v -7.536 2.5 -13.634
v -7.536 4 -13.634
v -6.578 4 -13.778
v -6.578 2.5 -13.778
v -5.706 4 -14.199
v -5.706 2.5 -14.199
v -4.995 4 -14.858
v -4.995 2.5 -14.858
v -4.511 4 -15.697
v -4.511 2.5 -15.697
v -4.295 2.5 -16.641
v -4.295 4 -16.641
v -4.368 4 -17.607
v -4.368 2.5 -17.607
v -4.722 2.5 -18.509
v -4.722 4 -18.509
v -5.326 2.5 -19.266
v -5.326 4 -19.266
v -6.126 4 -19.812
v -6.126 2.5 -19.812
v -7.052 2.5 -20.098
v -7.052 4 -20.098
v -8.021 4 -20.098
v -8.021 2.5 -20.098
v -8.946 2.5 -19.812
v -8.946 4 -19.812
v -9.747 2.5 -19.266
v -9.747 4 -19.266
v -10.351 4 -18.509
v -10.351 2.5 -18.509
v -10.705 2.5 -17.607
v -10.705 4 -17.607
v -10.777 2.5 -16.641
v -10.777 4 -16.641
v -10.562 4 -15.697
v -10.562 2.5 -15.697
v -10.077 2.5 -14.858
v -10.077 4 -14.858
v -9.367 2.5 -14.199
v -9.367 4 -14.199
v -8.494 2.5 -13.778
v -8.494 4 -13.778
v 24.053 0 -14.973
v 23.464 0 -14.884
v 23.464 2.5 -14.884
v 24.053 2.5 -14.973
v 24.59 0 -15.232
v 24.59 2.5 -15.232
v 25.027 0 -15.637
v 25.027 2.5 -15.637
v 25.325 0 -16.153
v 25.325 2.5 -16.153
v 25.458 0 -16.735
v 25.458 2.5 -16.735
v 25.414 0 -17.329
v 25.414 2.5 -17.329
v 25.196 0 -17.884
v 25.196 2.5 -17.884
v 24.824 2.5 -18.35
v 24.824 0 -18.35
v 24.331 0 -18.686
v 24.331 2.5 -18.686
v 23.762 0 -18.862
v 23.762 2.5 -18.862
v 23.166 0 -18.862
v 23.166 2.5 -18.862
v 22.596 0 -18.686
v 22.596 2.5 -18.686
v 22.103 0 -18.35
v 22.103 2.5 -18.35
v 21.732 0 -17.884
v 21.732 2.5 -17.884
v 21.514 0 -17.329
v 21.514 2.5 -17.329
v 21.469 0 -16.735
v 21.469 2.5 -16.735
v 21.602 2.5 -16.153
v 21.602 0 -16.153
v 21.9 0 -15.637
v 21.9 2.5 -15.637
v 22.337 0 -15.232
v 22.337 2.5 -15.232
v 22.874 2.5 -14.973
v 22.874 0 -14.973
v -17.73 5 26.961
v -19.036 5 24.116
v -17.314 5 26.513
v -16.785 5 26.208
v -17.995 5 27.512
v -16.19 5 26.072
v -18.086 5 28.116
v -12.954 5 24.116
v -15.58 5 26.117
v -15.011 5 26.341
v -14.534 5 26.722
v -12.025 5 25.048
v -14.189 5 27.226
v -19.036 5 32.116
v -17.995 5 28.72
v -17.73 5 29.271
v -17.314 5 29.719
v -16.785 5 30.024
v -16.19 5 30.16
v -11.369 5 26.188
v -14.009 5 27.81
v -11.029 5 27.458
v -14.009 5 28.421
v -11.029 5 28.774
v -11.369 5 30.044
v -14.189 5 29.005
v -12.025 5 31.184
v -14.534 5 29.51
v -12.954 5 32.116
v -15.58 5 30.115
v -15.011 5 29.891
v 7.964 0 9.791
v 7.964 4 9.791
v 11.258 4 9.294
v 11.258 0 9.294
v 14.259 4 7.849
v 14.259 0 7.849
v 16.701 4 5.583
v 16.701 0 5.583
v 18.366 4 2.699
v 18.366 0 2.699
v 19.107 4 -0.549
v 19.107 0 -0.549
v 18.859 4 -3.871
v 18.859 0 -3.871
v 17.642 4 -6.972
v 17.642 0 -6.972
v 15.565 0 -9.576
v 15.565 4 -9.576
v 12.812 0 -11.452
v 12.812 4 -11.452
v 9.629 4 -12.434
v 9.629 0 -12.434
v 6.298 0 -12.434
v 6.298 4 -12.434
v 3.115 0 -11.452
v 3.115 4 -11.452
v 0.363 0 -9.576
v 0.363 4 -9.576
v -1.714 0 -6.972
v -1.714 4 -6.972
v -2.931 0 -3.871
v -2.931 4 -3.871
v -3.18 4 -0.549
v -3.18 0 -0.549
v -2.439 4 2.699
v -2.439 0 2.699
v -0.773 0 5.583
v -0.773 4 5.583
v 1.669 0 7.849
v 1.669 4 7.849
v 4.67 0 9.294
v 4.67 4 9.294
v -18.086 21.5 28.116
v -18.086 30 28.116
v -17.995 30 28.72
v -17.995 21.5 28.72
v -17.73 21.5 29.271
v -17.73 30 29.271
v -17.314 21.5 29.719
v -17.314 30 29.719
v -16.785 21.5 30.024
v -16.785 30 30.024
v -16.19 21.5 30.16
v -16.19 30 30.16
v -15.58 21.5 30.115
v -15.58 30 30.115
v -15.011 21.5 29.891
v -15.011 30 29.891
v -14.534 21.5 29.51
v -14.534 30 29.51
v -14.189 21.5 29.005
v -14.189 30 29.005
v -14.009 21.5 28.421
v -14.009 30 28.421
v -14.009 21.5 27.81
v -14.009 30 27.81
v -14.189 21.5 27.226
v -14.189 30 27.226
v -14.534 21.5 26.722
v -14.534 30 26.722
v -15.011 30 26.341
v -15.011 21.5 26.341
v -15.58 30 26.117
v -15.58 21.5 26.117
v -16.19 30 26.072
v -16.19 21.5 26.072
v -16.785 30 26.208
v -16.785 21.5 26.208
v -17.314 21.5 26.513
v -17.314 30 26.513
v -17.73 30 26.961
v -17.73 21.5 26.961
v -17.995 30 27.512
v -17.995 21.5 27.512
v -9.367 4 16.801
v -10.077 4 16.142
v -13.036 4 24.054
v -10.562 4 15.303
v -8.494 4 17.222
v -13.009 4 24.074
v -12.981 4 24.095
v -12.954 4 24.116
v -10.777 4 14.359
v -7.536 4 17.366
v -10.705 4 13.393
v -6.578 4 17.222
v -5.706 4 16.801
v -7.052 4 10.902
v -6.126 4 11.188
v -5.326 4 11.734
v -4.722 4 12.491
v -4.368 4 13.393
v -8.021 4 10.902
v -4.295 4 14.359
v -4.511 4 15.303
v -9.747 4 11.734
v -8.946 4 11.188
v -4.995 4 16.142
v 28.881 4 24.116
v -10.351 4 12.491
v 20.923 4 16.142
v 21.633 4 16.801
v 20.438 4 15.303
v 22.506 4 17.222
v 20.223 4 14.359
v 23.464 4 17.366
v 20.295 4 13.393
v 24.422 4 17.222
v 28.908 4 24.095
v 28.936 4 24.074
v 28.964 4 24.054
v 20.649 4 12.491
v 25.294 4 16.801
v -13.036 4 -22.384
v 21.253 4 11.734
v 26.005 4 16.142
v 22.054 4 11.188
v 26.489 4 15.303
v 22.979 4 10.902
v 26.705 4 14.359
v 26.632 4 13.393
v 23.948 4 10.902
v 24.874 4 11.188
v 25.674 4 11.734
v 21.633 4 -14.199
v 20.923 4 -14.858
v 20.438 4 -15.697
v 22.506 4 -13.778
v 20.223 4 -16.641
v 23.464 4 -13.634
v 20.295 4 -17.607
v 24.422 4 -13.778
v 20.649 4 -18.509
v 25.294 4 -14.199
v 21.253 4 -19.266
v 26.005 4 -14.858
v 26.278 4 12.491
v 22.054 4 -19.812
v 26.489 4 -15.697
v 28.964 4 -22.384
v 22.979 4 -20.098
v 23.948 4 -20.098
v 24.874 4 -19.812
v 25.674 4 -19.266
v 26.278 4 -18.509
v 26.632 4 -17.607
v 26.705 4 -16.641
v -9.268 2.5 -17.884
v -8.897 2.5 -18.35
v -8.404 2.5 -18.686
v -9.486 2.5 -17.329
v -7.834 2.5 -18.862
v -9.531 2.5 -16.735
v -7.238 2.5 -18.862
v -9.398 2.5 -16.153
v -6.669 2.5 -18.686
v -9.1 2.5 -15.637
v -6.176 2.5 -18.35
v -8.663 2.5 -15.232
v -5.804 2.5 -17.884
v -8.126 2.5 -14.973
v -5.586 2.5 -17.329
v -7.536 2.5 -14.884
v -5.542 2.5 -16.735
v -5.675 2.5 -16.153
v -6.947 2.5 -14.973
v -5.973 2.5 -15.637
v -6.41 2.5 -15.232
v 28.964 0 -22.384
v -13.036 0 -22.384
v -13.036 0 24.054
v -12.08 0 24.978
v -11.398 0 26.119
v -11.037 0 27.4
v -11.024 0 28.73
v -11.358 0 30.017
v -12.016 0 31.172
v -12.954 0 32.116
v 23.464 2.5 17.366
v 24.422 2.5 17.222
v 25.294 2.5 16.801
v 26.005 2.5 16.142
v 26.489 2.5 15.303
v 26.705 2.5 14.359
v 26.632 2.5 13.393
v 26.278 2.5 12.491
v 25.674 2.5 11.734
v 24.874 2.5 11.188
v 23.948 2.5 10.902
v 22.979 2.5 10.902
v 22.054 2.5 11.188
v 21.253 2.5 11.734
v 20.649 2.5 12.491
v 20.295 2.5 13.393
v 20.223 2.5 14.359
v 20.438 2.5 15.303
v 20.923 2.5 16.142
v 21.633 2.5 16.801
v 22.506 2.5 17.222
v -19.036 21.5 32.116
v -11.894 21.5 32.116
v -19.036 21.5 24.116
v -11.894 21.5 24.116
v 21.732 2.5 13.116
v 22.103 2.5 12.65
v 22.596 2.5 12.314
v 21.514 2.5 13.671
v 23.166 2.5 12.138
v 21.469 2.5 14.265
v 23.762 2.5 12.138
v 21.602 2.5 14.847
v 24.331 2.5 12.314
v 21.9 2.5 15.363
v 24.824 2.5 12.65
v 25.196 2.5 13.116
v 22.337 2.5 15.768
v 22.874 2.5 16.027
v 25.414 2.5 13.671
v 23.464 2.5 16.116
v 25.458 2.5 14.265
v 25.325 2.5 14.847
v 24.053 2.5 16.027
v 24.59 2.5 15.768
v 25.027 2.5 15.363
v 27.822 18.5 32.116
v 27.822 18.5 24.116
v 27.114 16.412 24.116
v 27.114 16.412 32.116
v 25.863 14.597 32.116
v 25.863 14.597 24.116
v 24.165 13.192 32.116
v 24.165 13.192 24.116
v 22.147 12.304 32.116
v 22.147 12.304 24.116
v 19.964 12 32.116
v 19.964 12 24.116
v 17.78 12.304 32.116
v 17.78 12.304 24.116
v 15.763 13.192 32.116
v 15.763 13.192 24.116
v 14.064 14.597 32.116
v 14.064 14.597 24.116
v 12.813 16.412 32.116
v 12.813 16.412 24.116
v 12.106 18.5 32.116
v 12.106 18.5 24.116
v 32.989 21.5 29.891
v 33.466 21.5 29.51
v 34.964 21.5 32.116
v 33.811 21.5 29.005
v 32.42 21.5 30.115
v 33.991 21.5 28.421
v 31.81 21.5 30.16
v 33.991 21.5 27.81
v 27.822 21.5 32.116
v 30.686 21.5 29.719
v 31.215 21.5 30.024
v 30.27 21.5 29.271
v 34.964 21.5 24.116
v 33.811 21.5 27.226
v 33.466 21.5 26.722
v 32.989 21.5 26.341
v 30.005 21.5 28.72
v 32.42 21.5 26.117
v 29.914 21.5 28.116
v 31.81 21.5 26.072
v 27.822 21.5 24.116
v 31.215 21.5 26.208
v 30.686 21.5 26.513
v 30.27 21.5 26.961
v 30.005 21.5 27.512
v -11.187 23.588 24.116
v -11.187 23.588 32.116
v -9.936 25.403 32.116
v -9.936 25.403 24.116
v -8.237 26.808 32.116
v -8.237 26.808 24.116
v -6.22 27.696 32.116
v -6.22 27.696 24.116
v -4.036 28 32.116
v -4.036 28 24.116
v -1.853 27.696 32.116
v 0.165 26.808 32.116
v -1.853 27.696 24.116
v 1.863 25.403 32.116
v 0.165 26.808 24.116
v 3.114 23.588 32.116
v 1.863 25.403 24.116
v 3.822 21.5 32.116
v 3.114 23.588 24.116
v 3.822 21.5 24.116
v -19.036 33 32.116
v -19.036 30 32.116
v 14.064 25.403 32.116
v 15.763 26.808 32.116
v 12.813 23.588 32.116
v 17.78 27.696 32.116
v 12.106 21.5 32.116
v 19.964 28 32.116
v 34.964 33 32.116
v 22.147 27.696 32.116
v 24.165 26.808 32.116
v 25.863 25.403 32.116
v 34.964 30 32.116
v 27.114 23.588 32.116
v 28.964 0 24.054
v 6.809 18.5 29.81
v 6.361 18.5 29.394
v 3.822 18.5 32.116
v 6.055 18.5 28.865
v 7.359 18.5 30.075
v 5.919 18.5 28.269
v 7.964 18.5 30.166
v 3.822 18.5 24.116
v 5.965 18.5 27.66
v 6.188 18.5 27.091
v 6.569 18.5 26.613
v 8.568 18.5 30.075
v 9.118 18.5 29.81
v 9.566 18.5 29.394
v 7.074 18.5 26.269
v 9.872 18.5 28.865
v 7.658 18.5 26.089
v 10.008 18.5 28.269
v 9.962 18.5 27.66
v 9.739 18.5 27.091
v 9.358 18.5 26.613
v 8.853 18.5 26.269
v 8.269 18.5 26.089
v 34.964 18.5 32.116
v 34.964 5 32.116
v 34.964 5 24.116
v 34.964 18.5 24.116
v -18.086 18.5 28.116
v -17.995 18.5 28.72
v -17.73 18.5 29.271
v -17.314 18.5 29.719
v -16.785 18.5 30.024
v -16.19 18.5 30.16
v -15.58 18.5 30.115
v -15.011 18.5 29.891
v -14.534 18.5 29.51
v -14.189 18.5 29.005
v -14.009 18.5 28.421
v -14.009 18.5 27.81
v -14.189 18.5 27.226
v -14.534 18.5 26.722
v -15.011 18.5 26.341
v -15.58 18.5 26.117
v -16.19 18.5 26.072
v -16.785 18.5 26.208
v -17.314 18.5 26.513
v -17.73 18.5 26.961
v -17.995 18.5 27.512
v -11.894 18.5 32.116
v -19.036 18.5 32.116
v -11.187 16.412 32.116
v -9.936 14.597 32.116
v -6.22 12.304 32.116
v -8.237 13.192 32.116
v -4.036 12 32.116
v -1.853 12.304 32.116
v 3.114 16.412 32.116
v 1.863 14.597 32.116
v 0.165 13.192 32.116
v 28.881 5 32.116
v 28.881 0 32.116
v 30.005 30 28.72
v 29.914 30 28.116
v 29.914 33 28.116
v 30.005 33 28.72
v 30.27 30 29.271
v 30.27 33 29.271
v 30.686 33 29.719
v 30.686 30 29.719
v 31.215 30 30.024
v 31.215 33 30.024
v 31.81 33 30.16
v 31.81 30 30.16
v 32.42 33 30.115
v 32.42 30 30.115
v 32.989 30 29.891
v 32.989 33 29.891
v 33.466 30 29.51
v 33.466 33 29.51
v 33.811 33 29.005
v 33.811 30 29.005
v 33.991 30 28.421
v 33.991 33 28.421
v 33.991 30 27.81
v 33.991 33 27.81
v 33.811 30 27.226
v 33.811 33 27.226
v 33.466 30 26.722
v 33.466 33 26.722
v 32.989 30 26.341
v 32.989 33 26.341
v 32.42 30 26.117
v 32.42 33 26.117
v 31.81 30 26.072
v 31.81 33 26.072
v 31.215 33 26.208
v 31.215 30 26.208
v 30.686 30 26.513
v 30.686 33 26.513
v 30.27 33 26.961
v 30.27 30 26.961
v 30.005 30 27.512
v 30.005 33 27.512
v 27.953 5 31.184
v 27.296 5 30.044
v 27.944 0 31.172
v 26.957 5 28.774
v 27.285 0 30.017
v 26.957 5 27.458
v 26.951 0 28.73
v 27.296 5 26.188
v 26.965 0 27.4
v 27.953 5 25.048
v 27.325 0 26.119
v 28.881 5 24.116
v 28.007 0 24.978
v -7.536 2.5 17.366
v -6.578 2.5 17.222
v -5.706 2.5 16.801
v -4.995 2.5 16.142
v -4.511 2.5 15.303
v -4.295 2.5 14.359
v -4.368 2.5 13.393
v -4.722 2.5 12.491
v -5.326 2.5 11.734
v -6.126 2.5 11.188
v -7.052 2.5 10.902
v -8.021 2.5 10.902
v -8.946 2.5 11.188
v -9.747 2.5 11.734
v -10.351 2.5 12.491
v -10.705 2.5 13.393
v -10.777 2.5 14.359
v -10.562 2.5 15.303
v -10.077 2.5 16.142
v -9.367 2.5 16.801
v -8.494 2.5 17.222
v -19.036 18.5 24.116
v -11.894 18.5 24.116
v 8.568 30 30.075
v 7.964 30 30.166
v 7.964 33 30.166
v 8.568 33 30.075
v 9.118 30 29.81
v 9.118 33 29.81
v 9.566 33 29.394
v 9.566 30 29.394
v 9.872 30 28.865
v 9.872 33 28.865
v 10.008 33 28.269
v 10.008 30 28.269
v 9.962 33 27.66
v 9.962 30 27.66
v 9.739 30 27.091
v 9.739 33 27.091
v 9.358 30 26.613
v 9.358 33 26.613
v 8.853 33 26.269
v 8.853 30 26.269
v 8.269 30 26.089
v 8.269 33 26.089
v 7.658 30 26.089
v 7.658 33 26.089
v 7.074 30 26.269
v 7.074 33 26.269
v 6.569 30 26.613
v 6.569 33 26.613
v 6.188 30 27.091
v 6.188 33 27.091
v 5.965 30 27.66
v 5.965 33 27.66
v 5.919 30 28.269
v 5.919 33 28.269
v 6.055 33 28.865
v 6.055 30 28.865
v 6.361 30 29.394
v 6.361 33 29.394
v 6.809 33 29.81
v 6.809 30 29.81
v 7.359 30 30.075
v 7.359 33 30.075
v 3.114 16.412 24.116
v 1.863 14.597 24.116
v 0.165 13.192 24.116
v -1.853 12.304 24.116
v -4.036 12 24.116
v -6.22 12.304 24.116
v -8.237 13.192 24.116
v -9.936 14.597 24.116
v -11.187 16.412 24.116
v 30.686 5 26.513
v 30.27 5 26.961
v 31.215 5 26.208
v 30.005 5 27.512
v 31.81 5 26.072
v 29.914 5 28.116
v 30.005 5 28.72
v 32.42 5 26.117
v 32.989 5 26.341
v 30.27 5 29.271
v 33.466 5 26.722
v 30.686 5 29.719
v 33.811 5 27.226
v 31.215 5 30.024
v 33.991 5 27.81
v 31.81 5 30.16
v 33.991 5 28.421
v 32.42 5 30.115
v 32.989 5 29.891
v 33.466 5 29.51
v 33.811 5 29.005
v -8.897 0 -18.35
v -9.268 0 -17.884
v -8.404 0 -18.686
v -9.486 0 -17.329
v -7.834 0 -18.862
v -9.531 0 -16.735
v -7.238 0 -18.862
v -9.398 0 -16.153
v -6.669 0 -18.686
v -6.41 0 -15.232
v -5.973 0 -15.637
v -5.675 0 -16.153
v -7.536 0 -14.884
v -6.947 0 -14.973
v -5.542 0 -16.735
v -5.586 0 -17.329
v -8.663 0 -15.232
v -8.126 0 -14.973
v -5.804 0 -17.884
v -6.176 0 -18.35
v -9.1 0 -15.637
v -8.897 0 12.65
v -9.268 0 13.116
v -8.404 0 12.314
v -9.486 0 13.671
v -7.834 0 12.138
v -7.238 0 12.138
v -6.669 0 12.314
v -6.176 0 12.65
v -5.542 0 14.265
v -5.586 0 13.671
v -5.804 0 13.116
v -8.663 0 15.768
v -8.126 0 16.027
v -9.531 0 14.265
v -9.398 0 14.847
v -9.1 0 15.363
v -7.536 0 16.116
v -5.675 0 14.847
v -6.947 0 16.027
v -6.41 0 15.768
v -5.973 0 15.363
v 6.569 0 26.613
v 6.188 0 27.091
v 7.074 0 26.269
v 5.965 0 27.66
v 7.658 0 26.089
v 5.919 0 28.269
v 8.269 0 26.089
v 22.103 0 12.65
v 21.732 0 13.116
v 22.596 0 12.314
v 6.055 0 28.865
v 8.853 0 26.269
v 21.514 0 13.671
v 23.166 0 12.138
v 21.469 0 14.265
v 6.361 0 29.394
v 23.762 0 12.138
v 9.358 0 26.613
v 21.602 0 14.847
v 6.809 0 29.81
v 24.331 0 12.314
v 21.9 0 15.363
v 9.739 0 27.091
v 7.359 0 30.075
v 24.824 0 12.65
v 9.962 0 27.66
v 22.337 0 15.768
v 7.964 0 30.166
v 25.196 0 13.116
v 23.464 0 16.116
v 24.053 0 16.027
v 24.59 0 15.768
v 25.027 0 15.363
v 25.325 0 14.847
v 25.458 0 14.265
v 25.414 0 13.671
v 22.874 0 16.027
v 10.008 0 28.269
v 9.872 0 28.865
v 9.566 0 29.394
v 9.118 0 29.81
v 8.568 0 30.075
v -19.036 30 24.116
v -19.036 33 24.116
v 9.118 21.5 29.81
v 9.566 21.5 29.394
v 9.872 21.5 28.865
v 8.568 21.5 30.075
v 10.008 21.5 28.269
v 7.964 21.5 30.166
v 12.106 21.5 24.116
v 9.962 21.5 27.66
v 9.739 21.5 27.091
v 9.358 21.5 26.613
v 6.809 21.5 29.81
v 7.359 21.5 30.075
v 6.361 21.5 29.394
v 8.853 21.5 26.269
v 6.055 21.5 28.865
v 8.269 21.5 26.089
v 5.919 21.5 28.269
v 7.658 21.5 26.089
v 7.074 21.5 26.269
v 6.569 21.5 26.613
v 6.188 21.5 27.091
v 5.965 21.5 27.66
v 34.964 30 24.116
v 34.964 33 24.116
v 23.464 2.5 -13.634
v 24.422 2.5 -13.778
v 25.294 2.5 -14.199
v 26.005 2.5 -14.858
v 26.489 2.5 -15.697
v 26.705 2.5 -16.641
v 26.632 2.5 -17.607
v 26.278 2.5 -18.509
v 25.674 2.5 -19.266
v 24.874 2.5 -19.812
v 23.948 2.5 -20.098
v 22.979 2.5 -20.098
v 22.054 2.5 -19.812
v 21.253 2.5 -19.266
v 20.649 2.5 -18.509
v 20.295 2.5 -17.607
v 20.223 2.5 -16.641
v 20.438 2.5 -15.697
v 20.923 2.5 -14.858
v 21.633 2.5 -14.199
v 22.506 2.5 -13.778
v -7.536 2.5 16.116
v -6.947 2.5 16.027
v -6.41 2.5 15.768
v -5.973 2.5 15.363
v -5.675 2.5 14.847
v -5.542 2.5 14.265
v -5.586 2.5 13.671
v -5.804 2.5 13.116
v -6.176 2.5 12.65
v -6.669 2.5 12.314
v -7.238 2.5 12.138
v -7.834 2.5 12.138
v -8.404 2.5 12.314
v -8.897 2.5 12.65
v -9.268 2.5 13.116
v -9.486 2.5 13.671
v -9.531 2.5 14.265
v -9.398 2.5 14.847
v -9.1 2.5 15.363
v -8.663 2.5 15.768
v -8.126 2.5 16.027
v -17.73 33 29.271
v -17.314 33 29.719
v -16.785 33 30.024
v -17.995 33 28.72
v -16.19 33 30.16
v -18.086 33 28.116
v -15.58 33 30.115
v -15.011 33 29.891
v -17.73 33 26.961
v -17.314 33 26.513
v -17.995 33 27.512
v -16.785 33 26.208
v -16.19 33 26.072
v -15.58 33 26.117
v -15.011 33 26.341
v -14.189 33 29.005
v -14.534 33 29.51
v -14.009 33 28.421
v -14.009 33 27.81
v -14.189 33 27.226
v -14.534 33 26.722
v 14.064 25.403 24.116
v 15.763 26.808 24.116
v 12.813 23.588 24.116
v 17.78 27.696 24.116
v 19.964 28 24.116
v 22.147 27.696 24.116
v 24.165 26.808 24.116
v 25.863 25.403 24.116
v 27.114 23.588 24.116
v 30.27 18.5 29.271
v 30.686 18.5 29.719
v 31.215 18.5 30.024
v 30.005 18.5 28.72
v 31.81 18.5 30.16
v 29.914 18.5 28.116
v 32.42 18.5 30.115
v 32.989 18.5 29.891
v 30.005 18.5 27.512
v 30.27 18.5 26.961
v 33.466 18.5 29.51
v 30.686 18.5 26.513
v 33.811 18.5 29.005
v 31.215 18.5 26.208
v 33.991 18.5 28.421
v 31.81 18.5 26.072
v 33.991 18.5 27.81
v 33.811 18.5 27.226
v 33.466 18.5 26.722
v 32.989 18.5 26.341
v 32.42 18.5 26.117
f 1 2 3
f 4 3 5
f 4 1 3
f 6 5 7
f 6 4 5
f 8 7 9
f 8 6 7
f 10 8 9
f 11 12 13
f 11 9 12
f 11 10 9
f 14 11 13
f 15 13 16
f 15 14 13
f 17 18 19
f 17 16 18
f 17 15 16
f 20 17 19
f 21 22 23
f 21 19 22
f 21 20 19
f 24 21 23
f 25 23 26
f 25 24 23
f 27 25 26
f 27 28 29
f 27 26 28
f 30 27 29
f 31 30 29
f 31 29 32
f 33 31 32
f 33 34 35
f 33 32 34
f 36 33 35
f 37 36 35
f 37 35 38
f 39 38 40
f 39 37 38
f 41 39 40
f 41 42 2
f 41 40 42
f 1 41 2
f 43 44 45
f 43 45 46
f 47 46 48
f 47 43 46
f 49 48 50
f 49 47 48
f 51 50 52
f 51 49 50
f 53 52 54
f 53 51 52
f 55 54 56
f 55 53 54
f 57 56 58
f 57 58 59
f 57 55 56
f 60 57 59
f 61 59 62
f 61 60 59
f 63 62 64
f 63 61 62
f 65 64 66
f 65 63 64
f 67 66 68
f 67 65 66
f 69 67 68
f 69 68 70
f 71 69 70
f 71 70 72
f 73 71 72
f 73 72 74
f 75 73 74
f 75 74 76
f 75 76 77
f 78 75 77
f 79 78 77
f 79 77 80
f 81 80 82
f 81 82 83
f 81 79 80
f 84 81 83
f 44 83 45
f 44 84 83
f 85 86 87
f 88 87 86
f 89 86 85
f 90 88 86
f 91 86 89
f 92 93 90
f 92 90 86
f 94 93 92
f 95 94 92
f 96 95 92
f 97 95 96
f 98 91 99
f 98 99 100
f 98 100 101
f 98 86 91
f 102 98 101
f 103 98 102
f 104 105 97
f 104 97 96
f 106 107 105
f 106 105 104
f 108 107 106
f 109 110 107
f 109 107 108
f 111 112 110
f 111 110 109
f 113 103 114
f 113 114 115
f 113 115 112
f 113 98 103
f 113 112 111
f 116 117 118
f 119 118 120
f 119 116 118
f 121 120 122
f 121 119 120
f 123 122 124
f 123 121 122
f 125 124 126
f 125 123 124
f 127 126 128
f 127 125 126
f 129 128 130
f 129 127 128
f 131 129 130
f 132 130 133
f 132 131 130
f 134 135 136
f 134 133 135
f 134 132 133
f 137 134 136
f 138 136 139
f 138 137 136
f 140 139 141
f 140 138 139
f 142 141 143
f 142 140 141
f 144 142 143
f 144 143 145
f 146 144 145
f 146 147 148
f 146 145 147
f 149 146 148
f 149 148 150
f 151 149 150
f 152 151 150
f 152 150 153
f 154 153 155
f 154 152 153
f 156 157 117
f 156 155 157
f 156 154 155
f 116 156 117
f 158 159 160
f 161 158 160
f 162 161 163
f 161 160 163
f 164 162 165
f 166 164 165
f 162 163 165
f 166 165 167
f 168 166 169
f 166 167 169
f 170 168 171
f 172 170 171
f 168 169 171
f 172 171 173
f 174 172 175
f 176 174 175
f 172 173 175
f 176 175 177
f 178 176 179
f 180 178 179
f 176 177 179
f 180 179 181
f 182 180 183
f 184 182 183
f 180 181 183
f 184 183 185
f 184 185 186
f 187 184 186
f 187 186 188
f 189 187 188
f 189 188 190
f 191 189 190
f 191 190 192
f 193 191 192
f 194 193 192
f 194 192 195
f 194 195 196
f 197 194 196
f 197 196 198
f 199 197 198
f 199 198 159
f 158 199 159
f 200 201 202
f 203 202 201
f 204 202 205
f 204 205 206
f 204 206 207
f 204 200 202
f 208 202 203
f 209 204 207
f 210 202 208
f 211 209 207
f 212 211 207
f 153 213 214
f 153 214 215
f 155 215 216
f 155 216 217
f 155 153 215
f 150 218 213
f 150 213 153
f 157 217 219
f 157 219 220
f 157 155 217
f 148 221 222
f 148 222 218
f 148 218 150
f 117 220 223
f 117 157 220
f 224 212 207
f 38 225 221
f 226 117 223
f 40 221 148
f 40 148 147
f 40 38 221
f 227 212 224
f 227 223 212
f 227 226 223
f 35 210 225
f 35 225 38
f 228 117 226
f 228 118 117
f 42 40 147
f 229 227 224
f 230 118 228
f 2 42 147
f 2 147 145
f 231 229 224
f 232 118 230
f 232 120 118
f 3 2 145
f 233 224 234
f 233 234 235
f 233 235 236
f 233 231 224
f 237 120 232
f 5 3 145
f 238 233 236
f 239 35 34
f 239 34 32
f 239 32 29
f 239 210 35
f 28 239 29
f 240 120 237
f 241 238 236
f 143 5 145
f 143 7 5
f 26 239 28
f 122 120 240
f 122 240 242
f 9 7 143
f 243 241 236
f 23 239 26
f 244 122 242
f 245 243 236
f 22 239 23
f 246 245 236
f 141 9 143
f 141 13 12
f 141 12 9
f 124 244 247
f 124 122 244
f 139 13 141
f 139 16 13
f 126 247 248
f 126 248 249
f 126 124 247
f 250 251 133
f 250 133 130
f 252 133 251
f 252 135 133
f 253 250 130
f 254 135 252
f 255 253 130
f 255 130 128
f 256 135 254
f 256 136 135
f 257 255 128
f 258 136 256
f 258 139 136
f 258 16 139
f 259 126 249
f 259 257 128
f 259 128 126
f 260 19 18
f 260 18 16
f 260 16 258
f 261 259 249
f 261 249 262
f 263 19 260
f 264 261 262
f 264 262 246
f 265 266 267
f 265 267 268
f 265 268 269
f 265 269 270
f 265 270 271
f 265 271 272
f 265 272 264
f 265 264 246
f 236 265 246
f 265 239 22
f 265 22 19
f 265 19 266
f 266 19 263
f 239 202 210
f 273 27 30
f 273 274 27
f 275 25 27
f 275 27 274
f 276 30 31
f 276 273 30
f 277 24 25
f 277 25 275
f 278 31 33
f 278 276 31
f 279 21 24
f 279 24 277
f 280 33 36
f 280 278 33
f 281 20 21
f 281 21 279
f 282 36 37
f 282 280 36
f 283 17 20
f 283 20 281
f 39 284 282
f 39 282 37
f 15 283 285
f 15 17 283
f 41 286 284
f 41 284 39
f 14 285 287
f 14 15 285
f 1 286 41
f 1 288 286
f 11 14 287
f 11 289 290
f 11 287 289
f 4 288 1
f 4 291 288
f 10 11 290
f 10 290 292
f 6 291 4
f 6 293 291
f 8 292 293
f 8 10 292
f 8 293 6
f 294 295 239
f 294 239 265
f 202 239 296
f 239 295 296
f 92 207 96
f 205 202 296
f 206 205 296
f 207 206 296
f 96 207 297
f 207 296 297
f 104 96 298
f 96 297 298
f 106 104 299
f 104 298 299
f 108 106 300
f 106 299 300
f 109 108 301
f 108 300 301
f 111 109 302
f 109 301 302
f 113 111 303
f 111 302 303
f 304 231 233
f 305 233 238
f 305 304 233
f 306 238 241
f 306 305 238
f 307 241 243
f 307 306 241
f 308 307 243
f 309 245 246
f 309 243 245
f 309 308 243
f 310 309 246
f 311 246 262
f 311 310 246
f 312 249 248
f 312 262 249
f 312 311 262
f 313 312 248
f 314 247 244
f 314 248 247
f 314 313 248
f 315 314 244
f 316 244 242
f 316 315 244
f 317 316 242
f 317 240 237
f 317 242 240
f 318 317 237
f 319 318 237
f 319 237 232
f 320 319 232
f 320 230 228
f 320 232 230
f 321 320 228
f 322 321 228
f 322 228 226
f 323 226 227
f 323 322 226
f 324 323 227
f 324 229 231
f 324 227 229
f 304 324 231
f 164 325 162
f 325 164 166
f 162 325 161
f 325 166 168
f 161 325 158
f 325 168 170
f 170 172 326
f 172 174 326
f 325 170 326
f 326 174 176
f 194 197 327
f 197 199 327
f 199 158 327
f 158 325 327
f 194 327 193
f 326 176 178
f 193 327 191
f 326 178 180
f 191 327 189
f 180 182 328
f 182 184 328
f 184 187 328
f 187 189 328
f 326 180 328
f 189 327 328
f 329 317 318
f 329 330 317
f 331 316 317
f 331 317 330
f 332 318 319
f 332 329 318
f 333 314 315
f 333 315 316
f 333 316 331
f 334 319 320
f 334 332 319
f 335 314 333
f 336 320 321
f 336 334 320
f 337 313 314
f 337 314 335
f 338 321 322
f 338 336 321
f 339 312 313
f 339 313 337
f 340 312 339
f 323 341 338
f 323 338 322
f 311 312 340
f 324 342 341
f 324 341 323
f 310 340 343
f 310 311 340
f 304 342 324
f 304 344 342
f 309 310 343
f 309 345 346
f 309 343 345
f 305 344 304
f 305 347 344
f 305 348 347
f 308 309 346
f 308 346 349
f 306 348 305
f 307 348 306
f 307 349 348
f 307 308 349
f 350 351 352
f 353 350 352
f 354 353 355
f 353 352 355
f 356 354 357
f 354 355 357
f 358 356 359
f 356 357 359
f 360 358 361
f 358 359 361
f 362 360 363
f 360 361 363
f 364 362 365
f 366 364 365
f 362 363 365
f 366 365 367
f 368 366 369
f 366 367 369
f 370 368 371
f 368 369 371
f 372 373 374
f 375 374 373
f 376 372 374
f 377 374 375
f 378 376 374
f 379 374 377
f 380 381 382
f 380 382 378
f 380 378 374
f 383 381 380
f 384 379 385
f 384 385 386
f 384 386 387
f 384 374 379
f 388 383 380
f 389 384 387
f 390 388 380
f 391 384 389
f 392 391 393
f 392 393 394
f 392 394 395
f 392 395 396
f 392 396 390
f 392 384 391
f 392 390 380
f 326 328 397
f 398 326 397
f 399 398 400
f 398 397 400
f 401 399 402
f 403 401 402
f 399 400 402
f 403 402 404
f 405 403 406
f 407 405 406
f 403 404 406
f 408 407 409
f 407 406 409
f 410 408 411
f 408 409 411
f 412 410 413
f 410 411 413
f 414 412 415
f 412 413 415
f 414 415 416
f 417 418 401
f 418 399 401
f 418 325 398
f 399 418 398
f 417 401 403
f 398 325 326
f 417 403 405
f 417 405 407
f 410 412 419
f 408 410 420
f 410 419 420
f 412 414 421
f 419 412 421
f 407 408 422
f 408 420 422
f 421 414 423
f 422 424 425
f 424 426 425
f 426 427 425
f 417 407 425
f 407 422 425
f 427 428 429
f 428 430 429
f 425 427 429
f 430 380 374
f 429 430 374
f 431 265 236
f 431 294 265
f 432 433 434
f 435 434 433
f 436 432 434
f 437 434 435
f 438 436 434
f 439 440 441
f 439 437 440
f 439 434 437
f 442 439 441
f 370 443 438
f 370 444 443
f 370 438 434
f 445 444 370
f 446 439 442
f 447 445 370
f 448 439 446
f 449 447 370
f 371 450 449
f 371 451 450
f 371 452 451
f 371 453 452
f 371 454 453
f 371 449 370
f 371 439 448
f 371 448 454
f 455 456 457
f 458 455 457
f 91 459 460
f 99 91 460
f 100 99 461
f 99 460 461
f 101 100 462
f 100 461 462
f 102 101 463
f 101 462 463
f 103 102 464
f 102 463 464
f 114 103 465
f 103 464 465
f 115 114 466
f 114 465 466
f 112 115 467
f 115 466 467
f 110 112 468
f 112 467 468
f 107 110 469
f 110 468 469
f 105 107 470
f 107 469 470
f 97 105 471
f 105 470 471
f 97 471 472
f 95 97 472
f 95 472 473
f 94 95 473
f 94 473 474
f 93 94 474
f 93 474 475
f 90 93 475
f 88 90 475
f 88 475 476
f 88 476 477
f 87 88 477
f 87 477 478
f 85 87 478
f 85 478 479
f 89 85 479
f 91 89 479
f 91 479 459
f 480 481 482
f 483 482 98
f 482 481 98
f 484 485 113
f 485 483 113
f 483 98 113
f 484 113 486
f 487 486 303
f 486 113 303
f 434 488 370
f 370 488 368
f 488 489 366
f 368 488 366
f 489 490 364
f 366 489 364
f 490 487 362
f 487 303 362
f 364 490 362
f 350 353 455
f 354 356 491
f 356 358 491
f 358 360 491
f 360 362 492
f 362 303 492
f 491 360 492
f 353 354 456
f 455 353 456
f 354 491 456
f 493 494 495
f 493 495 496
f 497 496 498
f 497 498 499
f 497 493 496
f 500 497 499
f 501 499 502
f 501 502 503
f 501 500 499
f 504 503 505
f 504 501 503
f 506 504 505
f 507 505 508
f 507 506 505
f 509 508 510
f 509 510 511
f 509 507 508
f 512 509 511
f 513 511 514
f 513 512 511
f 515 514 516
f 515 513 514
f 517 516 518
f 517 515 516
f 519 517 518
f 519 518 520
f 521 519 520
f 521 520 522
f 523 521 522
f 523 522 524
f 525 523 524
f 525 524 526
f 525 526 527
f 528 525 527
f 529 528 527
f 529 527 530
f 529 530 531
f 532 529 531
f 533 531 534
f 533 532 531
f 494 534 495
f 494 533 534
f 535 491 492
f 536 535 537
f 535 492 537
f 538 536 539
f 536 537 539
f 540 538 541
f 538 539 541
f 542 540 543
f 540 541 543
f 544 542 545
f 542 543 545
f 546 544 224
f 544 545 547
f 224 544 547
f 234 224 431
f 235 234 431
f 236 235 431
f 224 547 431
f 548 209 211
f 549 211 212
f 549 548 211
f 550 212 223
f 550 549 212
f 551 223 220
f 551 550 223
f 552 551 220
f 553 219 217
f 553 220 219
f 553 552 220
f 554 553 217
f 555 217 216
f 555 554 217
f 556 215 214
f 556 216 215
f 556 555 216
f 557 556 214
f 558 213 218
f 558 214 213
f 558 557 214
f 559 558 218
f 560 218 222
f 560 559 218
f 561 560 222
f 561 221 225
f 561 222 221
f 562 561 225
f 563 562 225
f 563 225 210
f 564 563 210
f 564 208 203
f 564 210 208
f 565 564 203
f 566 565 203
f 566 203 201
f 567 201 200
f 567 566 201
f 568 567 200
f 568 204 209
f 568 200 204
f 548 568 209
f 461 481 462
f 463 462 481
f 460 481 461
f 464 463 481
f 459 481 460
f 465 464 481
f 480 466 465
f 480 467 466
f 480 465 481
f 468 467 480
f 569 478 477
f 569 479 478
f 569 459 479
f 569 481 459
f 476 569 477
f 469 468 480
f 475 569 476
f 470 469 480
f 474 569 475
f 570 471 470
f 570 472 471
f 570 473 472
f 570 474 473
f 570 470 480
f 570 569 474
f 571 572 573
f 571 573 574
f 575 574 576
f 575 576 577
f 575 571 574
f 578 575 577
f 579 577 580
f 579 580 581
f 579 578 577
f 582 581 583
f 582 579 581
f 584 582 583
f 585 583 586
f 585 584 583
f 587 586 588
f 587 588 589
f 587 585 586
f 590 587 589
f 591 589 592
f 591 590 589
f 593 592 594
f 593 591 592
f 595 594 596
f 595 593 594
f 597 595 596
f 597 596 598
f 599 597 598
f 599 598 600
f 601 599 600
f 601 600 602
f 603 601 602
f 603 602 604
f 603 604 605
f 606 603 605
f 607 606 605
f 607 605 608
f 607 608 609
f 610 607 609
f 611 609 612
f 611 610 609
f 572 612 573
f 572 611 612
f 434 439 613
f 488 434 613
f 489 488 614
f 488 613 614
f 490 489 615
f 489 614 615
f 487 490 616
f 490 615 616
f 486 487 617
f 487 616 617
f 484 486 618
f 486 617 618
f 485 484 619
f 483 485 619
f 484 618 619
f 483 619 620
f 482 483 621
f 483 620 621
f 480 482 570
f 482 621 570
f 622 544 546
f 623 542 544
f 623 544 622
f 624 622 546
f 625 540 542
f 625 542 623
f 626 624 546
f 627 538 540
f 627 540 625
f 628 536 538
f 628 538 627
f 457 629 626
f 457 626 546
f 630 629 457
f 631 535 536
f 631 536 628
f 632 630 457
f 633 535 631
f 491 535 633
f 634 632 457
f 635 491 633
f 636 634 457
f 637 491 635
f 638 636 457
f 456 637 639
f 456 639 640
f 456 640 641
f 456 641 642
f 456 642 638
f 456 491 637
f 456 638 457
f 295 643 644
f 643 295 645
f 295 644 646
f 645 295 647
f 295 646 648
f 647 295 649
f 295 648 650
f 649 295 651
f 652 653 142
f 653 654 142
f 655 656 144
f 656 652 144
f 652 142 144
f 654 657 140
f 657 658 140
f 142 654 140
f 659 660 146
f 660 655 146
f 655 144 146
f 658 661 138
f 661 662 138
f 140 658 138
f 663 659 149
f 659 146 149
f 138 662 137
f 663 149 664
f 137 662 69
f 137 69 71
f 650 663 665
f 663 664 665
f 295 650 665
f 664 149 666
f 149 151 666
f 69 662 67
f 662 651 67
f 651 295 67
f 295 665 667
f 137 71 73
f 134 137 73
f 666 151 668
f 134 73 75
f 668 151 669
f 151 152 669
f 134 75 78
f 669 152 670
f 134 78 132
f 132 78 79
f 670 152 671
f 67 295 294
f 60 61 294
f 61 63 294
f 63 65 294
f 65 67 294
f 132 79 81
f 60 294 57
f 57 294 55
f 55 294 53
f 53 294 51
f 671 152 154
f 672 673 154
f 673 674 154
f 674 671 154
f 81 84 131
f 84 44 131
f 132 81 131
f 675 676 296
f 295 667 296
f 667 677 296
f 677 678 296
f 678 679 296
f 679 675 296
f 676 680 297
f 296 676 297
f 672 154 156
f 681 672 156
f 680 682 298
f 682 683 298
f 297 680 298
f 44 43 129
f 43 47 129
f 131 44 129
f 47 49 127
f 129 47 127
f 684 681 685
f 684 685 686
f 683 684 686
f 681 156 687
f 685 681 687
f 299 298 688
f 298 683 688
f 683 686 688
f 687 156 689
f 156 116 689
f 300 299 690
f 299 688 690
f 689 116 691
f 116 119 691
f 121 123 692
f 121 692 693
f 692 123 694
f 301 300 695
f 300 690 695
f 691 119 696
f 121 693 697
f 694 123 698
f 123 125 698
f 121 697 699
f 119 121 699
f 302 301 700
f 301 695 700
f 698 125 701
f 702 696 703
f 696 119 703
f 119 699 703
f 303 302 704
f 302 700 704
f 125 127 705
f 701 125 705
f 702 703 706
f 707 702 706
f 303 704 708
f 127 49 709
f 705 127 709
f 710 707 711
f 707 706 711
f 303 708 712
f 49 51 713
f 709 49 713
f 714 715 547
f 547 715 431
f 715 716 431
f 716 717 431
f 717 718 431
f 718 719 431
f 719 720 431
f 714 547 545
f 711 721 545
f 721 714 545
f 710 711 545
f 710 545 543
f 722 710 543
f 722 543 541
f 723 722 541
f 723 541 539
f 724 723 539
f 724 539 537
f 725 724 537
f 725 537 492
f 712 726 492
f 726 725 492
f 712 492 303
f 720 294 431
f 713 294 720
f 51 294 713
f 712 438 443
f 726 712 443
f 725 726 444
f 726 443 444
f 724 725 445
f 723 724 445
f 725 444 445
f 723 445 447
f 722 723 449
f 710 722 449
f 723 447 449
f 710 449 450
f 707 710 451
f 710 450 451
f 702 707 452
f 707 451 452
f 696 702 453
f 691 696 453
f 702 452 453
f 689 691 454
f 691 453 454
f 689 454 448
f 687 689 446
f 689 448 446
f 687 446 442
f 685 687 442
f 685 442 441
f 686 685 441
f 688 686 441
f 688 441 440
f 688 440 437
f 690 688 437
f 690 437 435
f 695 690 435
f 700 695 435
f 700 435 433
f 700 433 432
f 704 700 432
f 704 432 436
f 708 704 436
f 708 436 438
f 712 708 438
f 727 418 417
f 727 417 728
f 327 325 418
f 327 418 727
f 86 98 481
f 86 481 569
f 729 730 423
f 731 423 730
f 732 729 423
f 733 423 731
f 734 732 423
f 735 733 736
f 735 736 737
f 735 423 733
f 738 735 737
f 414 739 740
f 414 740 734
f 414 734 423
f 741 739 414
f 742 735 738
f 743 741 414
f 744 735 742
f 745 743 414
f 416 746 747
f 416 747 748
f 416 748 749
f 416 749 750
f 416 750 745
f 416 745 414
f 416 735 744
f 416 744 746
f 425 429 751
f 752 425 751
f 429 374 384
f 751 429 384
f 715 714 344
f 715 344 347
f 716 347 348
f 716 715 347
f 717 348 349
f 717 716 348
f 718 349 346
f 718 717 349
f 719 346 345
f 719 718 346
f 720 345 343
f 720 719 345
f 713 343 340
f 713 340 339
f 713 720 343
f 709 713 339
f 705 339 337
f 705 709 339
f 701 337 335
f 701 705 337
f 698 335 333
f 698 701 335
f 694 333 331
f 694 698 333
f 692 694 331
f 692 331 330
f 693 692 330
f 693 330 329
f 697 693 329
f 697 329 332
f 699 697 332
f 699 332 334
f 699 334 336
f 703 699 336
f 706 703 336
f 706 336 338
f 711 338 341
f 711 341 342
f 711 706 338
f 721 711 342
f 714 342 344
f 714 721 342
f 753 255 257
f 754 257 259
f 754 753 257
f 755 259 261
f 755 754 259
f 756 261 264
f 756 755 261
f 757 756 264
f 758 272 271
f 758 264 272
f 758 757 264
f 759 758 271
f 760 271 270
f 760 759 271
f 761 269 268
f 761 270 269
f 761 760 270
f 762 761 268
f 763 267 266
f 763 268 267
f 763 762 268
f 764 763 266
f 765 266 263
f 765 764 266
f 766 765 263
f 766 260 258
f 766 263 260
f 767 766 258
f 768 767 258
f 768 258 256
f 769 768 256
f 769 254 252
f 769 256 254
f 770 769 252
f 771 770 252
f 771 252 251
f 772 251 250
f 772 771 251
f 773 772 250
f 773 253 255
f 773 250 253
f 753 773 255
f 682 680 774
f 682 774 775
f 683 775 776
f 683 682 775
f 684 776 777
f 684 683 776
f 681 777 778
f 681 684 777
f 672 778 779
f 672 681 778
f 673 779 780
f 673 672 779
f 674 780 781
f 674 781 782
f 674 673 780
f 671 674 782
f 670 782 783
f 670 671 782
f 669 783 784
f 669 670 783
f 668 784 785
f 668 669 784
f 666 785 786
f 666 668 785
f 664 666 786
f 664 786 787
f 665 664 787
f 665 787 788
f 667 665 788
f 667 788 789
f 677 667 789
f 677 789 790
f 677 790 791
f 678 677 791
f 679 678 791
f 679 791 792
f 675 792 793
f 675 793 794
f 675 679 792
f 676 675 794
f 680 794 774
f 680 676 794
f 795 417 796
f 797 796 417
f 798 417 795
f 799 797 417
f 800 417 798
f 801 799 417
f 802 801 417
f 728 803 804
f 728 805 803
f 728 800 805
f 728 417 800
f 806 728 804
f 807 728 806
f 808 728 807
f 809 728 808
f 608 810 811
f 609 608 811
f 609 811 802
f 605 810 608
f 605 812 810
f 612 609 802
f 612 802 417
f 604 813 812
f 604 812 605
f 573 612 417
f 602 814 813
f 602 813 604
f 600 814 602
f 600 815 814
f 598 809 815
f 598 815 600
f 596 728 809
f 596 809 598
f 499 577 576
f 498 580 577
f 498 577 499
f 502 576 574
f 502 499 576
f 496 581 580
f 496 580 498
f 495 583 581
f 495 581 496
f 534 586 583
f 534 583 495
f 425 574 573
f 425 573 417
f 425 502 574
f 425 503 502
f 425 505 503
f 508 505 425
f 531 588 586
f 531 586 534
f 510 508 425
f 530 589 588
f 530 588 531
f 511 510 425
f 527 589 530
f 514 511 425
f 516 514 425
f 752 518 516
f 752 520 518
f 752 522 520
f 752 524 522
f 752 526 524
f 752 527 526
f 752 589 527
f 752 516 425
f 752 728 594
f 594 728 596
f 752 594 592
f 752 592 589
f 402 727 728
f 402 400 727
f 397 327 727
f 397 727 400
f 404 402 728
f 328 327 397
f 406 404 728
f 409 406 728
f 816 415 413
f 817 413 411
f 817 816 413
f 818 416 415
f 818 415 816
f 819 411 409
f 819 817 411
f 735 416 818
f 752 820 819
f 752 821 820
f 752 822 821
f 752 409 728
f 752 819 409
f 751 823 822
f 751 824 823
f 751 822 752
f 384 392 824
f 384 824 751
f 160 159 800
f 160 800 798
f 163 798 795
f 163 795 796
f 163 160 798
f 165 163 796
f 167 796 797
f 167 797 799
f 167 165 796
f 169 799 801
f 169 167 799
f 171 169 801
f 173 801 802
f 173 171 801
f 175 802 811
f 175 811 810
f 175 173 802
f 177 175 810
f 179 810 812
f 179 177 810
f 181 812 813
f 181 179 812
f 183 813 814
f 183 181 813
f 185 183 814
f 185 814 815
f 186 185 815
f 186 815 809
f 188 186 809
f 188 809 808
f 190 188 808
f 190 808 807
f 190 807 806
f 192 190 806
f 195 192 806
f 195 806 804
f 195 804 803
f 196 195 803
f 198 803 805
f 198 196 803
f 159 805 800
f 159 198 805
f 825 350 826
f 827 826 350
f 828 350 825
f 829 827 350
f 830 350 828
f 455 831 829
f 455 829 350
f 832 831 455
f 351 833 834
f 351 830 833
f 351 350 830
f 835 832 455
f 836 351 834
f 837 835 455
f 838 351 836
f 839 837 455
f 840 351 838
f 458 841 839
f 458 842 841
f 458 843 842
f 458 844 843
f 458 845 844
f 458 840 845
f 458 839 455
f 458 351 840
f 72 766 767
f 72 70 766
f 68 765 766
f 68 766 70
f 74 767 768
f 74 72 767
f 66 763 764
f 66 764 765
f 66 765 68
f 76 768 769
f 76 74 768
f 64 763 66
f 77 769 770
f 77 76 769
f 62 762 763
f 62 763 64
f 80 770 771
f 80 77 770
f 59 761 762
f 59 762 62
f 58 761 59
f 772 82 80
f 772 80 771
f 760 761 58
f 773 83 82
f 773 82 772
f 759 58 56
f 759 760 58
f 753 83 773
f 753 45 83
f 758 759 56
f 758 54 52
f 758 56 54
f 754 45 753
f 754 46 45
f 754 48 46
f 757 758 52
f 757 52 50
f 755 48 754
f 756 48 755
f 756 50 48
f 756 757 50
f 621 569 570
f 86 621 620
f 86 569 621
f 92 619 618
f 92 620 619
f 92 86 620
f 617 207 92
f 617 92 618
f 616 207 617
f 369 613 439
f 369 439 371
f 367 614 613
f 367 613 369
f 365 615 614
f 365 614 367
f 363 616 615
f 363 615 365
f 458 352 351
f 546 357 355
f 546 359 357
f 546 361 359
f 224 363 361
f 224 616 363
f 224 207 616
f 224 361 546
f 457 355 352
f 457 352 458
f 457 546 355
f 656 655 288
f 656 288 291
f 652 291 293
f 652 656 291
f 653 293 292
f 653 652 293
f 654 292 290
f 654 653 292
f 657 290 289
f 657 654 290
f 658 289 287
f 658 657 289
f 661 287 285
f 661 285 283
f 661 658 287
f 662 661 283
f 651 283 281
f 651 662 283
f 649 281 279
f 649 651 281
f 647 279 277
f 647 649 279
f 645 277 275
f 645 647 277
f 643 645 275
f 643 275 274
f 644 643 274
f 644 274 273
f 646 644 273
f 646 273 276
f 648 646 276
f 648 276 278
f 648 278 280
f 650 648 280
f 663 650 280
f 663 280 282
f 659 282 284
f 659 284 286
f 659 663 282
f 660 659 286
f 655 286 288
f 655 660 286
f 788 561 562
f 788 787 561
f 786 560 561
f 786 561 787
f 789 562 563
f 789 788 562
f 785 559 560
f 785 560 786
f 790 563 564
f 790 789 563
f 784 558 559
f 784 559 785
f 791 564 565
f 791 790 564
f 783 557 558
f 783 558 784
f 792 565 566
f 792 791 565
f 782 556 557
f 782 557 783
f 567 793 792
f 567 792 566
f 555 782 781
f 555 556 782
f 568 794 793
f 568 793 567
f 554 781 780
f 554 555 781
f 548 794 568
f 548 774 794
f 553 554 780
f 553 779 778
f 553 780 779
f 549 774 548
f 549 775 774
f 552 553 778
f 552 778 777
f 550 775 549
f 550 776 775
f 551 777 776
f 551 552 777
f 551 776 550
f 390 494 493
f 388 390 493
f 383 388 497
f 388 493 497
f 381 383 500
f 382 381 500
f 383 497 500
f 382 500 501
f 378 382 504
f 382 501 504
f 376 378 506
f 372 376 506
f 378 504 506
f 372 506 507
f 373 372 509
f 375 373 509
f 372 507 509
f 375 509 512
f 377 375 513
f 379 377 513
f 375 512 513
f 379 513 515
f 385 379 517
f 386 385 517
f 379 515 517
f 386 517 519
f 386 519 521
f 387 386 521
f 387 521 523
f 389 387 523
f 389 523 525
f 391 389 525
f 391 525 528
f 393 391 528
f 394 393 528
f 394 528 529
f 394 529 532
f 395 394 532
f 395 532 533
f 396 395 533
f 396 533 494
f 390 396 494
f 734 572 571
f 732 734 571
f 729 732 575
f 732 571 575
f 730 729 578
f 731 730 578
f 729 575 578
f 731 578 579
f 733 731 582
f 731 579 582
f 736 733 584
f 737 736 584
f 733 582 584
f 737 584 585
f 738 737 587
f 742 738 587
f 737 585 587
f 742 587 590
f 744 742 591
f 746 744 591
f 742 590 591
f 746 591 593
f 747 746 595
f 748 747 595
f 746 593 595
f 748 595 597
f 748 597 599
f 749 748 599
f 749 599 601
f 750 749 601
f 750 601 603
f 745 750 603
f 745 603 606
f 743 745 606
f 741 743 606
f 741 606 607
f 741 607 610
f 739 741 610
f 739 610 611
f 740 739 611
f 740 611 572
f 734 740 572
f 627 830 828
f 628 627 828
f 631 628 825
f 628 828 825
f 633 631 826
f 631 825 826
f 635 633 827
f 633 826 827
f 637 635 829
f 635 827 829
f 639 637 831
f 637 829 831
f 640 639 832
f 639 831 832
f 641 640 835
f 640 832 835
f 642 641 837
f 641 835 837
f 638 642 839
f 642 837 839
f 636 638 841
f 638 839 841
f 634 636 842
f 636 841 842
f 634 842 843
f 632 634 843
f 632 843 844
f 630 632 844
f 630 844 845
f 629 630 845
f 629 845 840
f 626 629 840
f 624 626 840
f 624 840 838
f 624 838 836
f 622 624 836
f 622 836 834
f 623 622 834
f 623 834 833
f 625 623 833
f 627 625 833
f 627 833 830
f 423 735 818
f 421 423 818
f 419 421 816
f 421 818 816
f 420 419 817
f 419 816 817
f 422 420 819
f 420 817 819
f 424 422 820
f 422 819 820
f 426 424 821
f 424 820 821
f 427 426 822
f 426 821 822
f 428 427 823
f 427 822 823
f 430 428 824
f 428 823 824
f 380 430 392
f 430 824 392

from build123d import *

# Parameters (mm, degrees)
SKETCH1_W           = 42
SKETCH1_H           = 54.5
SKETCH1_R           = 3.25
SKETCH1_R_2         = 11.175
BOSS_EXTRUDE1_DEPTH = 5
BOSS_EXTRUDE2_START = 5
SKETCH1_3_W         = 42
SKETCH1_3_H         = 8
BOSS_EXTRUDE2_DEPTH = 30
SKETCH2_R           = 8
CUT_EXTRUDE1_DEPTH  = 66.008808429
SKETCH3_R           = 2.05
CUT_EXTRUDE3_DEPTH  = 56.635668466
SKETCH1_4_W         = 6
SKETCH1_4_H         = 8
BOSS_EXTRUDE3_DEPTH = 18.5
SKETCH4_R           = 2.05
CUT_EXTRUDE4_DEPTH  = 51.952348832
SKETCH5_W           = 7.141883177
SKETCH5_H           = 8
SKETCH5_R           = 2.05
BOSS_EXTRUDE4_DEPTH = 13.5
SKETCH6_W           = 54
SKETCH6_H           = 8
CUT_EXTRUDE5_DEPTH  = 5
SKETCH7_W           = 6
SKETCH7_H           = 8
CUT_EXTRUDE8_DEPTH  = 5
SKETCH8_R           = 5.05
SKETCH8_R_2         = 2.05
CUT_EXTRUDE9_DEPTH  = 5
CUT_EXTRUDE10_DEPTH = 1
SKETCH10_W          = 54
SKETCH10_H          = 8
SKETCH10_R          = 2.05
BOSS_EXTRUDE5_DEPTH = 3
SKETCH1_5_R         = 3.25
SKETCH1_5_R_2       = 2
BOSS_EXTRUDE6_DEPTH = 2.5


with BuildPart() as part:
    # Sketch1 → Boss-Extrude1 (new body)
    with BuildSketch(Plane(origin=(0, 0, 0), x_dir=(1, 0, 0), z_dir=(0, 1, 0))):
        with Locations((7.963687151, -4.865921788)):
            Rectangle(SKETCH1_W, SKETCH1_H)
        with Locations(Location((23.463687151, 16.884078212, 0), (0, 0, 270))):
            Circle(SKETCH1_R, mode=Mode.SUBTRACT)
        with Locations(Location((-7.536312849, -14.115921788, 0), (0, 0, 270))):
            Circle(SKETCH1_R, mode=Mode.SUBTRACT)
        with Locations(Location((23.463687151, -14.115921788, 0), (0, 0, 270))):
            Circle(SKETCH1_R, mode=Mode.SUBTRACT)
        with Locations(Location((7.963687151, 1.384078212, 0), (0, 0, 270))):
            Circle(SKETCH1_R_2, mode=Mode.SUBTRACT)
        with Locations(Location((-7.536312849, 16.884078212, 0), (0, 0, 270))):
            Circle(SKETCH1_R, mode=Mode.SUBTRACT)
    extrude(amount=BOSS_EXTRUDE1_DEPTH)

    # Sketch1<3> → Boss-Extrude2 (add)
    with BuildSketch(Plane(origin=(0, 0, 0), x_dir=(1, 0, 0), z_dir=(0, 1, 0)).offset(BOSS_EXTRUDE2_START)):
        with Locations((7.963687151, -28.115921788)):
            Rectangle(SKETCH1_3_W, SKETCH1_3_H)
    extrude(amount=BOSS_EXTRUDE2_DEPTH)

    # Sketch2 → Cut-Extrude1 (cut, through all)
    with BuildSketch(Plane(origin=(0, 0, 24.115921788), x_dir=(-1, 0, 0), z_dir=(0, 0, -1))):
        with Locations((4.036312849, 20)):
            Circle(SKETCH2_R)
        with Locations((-19.963687151, 20)):
            Circle(SKETCH2_R)
        Polygon((-28.963687151, 20), (-28.963687151, 21.5), (13.036312849, 21.5), (13.036312849, 20), (13.036312849, 18.5), (-28.963687151, 18.5), align=None)
    extrude(amount=-CUT_EXTRUDE1_DEPTH, mode=Mode.SUBTRACT)


with BuildPart() as cut_extrude1_piece_1:
    # of the separate pieces the step leaves, piece 1, a body of its own (cut_extrude1_pieces)
    add(part.part.solids().sort_by_distance((-13.036312849, 18.5, 32.115921788))[0])


with BuildPart() as cut_extrude1_piece_2:
    # of the separate pieces the step leaves, piece 2, a body of its own (cut_extrude1_pieces)
    add(part.part.solids().sort_by_distance((-13.036312849, 35, 32.115921788))[0])


with BuildPart() as cut_extrude3_tool:
    # Sketch3 → Cut-Extrude3 (new, through all)
    with BuildSketch(Plane(origin=(0, 35, 0), x_dir=(1, 0, 0), z_dir=(0, 1, 0))):
        with Locations(Location((7.963687151, -28.115921788, 0), (0, 0, 270))):
            Circle(SKETCH3_R)
    extrude(amount=-CUT_EXTRUDE3_DEPTH)


with BuildPart() as cut_extrude1_piece_1_1:
    add(cut_extrude1_piece_1.part)

    # Cut-Extrude3: cut by cut_extrude3_tool
    add(cut_extrude3_tool.part, mode=Mode.SUBTRACT)

    # Sketch1<4> → Boss-Extrude3 (add)
    with BuildSketch(Plane(origin=(0, 0, 0), x_dir=(1, 0, 0), z_dir=(0, 1, 0))):
        with Locations((31.963687151, -28.115921788)):
            Rectangle(SKETCH1_4_W, SKETCH1_4_H)
        with Locations((-16.036312849, -28.115921788)):
            Rectangle(SKETCH1_4_W, SKETCH1_4_H)
    extrude(amount=BOSS_EXTRUDE3_DEPTH)

    # Sketch4 → Cut-Extrude4 (cut, through all)
    with BuildSketch(Plane(origin=(0, 18.5, 0), x_dir=(1, 0, 0), z_dir=(0, 1, 0))):
        with Locations(Location((-16.036312849, -28.115921788, 0), (0, 0, 180))):
            Circle(SKETCH4_R)
        with Locations(Location((31.963687151, -28.115921788, 0), (0, 0, 180))):
            Circle(SKETCH4_R)
    extrude(amount=-CUT_EXTRUDE4_DEPTH, mode=Mode.SUBTRACT)

    # Sketch7 → Cut-Extrude8 (cut)
    with BuildSketch(Plane.XZ):
        with Locations((-16.036312849, 28.115921788)):
            Rectangle(SKETCH7_W, SKETCH7_H)
        with Locations((31.963687151, 28.115921788)):
            Rectangle(SKETCH7_W, SKETCH7_H)
    extrude(amount=-CUT_EXTRUDE8_DEPTH, mode=Mode.SUBTRACT)

    # Sketch8 → Cut-Extrude9 (cut)
    # profile 1 of 2: a face of its own
    with BuildSketch(Plane.XZ):
        with Locations((-16.036312849, 28.115921788)):
            Circle(SKETCH8_R)
        with Locations(Location((-16.036312849, 28.115921788, 0), (0, 0, 180))):
            Circle(SKETCH8_R_2, mode=Mode.SUBTRACT)
    # profile 2 of 2: a face of its own
    with BuildSketch(Plane.XZ):
        with Locations((31.963687151, 28.115921788)):
            Circle(SKETCH8_R)
        with Locations(Location((31.963687151, 28.115921788, 0), (0, 0, 180))):
            Circle(SKETCH8_R_2, mode=Mode.SUBTRACT)
    extrude(amount=-CUT_EXTRUDE9_DEPTH, mode=Mode.SUBTRACT)

    # Sketch9 → Cut-Extrude10 (cut)
    with BuildSketch(Plane(origin=(0, 5, 0), x_dir=(1, 0, 0), z_dir=(0, 1, 0))):
        with BuildLine():
            Line((-12.953700321, -24.115921788), (28.881074622, -24.115921788))
            ThreePointArc((28.881074622, -24.115921788), (28.922221229, -24.084546706), (28.963687151, -24.053594868))
            Line((28.963687151, -24.053594868), (28.963687151, 22.384078212))
            Line((28.963687151, 22.384078212), (-13.036312849, 22.384078212))
            Line((-13.036312849, 22.384078212), (-13.036312849, -24.053594868))
            ThreePointArc((-13.036312849, -24.053594868), (-12.994846927, -24.084546706), (-12.953700321, -24.115921788))
        make_face()
    extrude(amount=-CUT_EXTRUDE10_DEPTH, mode=Mode.SUBTRACT)

    # Sketch1<5> → Boss-Extrude6 (add)
    # profile 1 of 4: a face of its own
    with BuildSketch(Plane(origin=(0, 0, 0), x_dir=(1, 0, 0), z_dir=(0, 1, 0))):
        with Locations(Location((23.463687151, 16.884078212, 0), (0, 0, 270))):
            Circle(SKETCH1_5_R)
        with Locations(Location((23.463687151, 16.884078212, 0), (0, 0, 270))):
            Circle(SKETCH1_5_R_2, mode=Mode.SUBTRACT)
    # profile 2 of 4: a face of its own
    with BuildSketch(Plane(origin=(0, 0, 0), x_dir=(1, 0, 0), z_dir=(0, 1, 0))):
        with Locations(Location((23.463687151, -14.115921788, 0), (0, 0, 270))):
            Circle(SKETCH1_5_R)
        with Locations(Location((23.463687151, -14.115921788, 0), (0, 0, 270))):
            Circle(SKETCH1_5_R_2, mode=Mode.SUBTRACT)
    # profile 3 of 4: a face of its own
    with BuildSketch(Plane(origin=(0, 0, 0), x_dir=(1, 0, 0), z_dir=(0, 1, 0))):
        with Locations(Location((-7.536312849, 16.884078212, 0), (0, 0, 270))):
            Circle(SKETCH1_5_R)
        with Locations(Location((-7.536312849, 16.884078212, 0), (0, 0, 270))):
            Circle(SKETCH1_5_R_2, mode=Mode.SUBTRACT)
    # profile 4 of 4: a face of its own
    with BuildSketch(Plane(origin=(0, 0, 0), x_dir=(1, 0, 0), z_dir=(0, 1, 0))):
        with Locations(Location((-7.536312849, -14.115921788, 0), (0, 0, 270))):
            Circle(SKETCH1_5_R)
        with Locations(Location((-7.536312849, -14.115921788, 0), (0, 0, 270))):
            Circle(SKETCH1_5_R_2, mode=Mode.SUBTRACT)
    extrude(amount=BOSS_EXTRUDE6_DEPTH)


with BuildPart() as cut_extrude1_piece_2_1:
    add(cut_extrude1_piece_2.part)

    # Cut-Extrude3: cut by cut_extrude3_tool
    add(cut_extrude3_tool.part, mode=Mode.SUBTRACT)

    # Sketch5 → Boss-Extrude4 (add)
    # profile 1 of 2: a face of its own
    with BuildSketch(Plane(origin=(0, 35, 0), x_dir=(1, 0, 0), z_dir=(0, 1, 0))):
        with Locations((-15.465371261, -28.115921788)):
            Rectangle(SKETCH5_W, SKETCH5_H)
        with Locations(Location((-16.036312849, -28.115921788, 0), (0, 0, 180))):
            Circle(SKETCH5_R, mode=Mode.SUBTRACT)
    # profile 2 of 2: a face of its own
    with BuildSketch(Plane(origin=(0, 35, 0), x_dir=(1, 0, 0), z_dir=(0, 1, 0))):
        with Locations((31.392745563, -28.115921788)):
            Rectangle(SKETCH5_W, SKETCH5_H)
        with Locations(Location((31.963687151, -28.115921788, 0), (0, 0, 180))):
            Circle(SKETCH5_R, mode=Mode.SUBTRACT)
    extrude(amount=-BOSS_EXTRUDE4_DEPTH)

    # Sketch6 → Cut-Extrude5 (cut)
    with BuildSketch(Plane(origin=(0, 35, 0), x_dir=(1, 0, 0), z_dir=(0, 1, 0))):
        with Locations((7.963687151, -28.115921788)):
            Rectangle(SKETCH6_W, SKETCH6_H)
    extrude(amount=-CUT_EXTRUDE5_DEPTH, mode=Mode.SUBTRACT)

    # Sketch10 → Boss-Extrude5 (add)
    with BuildSketch(Plane(origin=(0, 30, 0), x_dir=(1, 0, 0), z_dir=(0, 1, 0))):
        with Locations((7.963687151, -28.115921788)):
            Rectangle(SKETCH10_W, SKETCH10_H)
        with Locations(Location((31.963687151, -28.115921788, 0), (0, 0, 180))):
            Circle(SKETCH10_R, mode=Mode.SUBTRACT)
        with Locations(Location((7.963687151, -28.115921788, 0), (0, 0, 270))):
            Circle(SKETCH10_R, mode=Mode.SUBTRACT)
        with Locations(Location((-16.036312849, -28.115921788, 0), (0, 0, 180))):
            Circle(SKETCH10_R, mode=Mode.SUBTRACT)
    extrude(amount=BOSS_EXTRUDE5_DEPTH)


solid = Compound([cut_extrude1_piece_1_1.part, cut_extrude1_piece_2_1.part])
